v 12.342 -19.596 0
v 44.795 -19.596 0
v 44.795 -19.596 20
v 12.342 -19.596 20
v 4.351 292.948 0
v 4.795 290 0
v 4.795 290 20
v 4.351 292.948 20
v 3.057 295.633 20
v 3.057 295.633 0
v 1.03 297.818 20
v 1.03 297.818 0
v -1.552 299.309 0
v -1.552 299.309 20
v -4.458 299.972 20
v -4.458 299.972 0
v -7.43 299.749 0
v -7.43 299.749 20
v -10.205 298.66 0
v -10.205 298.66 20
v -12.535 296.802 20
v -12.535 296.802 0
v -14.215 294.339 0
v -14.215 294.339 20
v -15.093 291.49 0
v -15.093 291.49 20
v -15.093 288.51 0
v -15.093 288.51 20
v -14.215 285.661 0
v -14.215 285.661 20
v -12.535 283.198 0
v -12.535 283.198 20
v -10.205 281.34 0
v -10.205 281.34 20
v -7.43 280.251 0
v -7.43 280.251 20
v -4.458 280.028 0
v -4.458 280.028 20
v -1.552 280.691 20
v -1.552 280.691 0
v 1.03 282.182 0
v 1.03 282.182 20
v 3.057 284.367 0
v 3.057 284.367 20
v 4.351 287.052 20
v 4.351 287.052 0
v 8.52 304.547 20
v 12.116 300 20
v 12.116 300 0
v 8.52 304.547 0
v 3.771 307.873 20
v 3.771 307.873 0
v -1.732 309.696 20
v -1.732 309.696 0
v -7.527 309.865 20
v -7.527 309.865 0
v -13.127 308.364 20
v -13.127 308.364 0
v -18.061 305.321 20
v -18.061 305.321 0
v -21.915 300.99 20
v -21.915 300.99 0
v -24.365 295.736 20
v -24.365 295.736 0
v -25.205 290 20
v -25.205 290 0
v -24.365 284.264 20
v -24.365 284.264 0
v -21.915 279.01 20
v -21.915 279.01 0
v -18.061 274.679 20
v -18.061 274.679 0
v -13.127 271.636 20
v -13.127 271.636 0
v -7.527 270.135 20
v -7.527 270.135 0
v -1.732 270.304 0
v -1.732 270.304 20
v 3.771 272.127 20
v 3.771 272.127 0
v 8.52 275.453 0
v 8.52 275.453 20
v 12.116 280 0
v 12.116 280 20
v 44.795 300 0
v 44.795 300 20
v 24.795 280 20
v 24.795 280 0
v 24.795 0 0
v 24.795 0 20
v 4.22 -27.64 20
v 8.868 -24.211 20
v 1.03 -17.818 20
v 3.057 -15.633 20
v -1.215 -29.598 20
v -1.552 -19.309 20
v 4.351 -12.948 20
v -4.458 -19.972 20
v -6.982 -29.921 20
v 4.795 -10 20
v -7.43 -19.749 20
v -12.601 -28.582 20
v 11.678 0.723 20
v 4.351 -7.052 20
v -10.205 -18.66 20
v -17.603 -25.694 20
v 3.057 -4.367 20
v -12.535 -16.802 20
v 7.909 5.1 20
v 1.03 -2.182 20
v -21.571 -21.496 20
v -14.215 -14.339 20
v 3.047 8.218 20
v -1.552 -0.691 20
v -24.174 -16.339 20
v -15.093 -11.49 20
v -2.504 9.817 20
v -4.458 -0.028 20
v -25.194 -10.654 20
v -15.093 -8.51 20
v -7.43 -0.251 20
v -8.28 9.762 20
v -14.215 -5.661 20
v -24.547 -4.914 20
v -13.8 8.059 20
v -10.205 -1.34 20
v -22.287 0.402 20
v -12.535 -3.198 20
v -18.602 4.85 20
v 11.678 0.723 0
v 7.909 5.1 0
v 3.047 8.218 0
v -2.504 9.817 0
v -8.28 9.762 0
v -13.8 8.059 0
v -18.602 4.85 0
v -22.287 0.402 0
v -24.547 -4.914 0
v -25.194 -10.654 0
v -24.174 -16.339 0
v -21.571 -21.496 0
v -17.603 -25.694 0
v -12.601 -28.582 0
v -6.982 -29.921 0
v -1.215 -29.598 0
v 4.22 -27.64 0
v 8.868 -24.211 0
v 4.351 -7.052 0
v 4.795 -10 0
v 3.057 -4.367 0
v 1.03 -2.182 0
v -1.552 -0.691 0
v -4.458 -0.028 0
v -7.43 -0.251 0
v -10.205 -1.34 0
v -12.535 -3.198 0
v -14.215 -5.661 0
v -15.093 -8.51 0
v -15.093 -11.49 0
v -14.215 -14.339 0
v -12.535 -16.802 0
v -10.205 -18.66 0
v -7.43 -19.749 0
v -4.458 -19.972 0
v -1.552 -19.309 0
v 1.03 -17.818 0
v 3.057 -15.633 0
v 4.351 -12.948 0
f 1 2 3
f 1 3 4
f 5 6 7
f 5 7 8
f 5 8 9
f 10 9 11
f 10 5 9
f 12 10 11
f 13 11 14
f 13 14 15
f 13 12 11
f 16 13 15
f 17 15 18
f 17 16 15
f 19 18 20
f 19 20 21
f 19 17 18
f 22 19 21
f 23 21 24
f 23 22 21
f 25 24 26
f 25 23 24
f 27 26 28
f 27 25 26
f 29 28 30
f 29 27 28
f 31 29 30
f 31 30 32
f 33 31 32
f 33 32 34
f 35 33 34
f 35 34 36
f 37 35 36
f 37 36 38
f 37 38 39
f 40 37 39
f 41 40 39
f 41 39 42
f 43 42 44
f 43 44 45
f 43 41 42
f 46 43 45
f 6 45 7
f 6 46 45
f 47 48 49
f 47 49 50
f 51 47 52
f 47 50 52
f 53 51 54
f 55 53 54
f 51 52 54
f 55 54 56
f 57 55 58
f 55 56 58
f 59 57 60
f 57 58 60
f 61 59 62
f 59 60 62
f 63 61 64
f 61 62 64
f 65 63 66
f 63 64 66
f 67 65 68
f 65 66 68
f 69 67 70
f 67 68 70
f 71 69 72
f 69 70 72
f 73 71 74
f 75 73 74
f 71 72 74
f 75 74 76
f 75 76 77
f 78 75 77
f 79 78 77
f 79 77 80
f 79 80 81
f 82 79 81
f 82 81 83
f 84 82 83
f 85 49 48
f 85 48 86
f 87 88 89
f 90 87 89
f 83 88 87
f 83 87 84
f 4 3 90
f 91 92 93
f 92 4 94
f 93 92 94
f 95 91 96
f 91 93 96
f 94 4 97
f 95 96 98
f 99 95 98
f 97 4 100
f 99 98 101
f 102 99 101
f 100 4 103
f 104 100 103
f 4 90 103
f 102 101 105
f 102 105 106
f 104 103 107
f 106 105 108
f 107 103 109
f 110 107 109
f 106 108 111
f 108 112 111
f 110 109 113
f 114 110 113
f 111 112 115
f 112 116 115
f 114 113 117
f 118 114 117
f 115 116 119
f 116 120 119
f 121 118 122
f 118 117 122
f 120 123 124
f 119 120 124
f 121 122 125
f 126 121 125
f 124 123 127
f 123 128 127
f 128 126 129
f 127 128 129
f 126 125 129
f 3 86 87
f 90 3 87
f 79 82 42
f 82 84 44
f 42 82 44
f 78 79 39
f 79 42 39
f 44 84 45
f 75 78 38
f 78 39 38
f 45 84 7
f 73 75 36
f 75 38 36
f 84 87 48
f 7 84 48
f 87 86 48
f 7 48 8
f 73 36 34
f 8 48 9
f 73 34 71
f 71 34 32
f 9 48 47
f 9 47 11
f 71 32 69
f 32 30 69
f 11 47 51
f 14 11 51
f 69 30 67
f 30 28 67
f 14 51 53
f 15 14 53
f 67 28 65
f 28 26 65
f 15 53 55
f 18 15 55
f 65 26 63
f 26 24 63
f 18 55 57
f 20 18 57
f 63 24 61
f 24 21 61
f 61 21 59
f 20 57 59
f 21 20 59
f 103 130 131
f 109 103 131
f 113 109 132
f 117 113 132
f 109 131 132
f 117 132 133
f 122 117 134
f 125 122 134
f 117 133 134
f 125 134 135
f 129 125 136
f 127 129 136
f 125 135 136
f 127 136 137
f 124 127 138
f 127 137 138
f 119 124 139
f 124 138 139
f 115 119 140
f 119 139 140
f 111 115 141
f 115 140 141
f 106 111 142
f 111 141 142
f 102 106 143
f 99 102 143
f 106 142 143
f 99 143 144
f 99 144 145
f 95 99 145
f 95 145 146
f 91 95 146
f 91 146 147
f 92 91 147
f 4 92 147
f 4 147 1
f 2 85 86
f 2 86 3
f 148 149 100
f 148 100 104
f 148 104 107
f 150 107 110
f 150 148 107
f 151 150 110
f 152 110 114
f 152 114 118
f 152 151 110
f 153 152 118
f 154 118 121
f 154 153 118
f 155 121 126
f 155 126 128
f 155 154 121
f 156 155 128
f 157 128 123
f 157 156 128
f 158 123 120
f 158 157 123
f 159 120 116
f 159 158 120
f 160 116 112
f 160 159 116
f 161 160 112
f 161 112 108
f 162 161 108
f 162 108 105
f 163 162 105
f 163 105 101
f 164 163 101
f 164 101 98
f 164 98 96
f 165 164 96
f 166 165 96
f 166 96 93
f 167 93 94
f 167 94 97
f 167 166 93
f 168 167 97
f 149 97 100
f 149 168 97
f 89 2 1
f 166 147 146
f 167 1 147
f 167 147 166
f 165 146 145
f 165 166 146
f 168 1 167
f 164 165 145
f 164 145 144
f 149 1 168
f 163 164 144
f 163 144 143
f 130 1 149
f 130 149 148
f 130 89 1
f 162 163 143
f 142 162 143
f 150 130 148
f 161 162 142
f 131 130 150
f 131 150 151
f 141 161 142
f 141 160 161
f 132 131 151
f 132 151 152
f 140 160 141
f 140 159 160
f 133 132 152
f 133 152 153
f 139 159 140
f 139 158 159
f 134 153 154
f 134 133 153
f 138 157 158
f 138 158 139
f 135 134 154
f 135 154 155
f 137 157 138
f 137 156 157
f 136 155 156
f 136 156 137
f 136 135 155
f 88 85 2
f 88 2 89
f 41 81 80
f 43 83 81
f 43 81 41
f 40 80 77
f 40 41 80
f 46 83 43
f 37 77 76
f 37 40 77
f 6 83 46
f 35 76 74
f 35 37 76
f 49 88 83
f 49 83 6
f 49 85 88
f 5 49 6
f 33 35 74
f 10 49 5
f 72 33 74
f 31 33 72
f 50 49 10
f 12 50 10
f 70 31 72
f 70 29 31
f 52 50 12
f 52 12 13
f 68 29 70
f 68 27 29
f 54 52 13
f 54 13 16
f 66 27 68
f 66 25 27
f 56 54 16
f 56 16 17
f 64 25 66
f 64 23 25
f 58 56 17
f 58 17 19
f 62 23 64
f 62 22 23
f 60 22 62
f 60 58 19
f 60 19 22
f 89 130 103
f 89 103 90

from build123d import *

# Parameters (mm, degrees)
SKETCH_R      = 10
EXTRUDE_DEPTH = 20


with BuildPart() as part:
    # Sketch → Extrude (new body)
    with BuildSketch(Plane.XY):
        with BuildLine():
            Line((11.677619, 0.722876), (24.795086, 0))
            Line((24.795086, 280), (24.795086, 0))
            Line((24.795086, 280), (12.115594, 280))
            ThreePointArc((12.115594, 300), (-25.204914, 290), (12.115594, 280))
            Line((12.115594, 300), (44.795086, 300))
            Line((44.795086, 300), (44.795086, -19.596431))
            Line((44.795086, -19.596431), (12.342408, -19.596431))
            ThreePointArc((11.677619, 0.722876), (-25.194218, -10.653992), (12.342408, -19.596431))
        make_face()
        with Locations((-5.204914, -10)):
            Circle(SKETCH_R, mode=Mode.SUBTRACT)
        with Locations((-5.204914, 290)):
            Circle(SKETCH_R, mode=Mode.SUBTRACT)
    extrude(amount=EXTRUDE_DEPTH)


solid = part.part
